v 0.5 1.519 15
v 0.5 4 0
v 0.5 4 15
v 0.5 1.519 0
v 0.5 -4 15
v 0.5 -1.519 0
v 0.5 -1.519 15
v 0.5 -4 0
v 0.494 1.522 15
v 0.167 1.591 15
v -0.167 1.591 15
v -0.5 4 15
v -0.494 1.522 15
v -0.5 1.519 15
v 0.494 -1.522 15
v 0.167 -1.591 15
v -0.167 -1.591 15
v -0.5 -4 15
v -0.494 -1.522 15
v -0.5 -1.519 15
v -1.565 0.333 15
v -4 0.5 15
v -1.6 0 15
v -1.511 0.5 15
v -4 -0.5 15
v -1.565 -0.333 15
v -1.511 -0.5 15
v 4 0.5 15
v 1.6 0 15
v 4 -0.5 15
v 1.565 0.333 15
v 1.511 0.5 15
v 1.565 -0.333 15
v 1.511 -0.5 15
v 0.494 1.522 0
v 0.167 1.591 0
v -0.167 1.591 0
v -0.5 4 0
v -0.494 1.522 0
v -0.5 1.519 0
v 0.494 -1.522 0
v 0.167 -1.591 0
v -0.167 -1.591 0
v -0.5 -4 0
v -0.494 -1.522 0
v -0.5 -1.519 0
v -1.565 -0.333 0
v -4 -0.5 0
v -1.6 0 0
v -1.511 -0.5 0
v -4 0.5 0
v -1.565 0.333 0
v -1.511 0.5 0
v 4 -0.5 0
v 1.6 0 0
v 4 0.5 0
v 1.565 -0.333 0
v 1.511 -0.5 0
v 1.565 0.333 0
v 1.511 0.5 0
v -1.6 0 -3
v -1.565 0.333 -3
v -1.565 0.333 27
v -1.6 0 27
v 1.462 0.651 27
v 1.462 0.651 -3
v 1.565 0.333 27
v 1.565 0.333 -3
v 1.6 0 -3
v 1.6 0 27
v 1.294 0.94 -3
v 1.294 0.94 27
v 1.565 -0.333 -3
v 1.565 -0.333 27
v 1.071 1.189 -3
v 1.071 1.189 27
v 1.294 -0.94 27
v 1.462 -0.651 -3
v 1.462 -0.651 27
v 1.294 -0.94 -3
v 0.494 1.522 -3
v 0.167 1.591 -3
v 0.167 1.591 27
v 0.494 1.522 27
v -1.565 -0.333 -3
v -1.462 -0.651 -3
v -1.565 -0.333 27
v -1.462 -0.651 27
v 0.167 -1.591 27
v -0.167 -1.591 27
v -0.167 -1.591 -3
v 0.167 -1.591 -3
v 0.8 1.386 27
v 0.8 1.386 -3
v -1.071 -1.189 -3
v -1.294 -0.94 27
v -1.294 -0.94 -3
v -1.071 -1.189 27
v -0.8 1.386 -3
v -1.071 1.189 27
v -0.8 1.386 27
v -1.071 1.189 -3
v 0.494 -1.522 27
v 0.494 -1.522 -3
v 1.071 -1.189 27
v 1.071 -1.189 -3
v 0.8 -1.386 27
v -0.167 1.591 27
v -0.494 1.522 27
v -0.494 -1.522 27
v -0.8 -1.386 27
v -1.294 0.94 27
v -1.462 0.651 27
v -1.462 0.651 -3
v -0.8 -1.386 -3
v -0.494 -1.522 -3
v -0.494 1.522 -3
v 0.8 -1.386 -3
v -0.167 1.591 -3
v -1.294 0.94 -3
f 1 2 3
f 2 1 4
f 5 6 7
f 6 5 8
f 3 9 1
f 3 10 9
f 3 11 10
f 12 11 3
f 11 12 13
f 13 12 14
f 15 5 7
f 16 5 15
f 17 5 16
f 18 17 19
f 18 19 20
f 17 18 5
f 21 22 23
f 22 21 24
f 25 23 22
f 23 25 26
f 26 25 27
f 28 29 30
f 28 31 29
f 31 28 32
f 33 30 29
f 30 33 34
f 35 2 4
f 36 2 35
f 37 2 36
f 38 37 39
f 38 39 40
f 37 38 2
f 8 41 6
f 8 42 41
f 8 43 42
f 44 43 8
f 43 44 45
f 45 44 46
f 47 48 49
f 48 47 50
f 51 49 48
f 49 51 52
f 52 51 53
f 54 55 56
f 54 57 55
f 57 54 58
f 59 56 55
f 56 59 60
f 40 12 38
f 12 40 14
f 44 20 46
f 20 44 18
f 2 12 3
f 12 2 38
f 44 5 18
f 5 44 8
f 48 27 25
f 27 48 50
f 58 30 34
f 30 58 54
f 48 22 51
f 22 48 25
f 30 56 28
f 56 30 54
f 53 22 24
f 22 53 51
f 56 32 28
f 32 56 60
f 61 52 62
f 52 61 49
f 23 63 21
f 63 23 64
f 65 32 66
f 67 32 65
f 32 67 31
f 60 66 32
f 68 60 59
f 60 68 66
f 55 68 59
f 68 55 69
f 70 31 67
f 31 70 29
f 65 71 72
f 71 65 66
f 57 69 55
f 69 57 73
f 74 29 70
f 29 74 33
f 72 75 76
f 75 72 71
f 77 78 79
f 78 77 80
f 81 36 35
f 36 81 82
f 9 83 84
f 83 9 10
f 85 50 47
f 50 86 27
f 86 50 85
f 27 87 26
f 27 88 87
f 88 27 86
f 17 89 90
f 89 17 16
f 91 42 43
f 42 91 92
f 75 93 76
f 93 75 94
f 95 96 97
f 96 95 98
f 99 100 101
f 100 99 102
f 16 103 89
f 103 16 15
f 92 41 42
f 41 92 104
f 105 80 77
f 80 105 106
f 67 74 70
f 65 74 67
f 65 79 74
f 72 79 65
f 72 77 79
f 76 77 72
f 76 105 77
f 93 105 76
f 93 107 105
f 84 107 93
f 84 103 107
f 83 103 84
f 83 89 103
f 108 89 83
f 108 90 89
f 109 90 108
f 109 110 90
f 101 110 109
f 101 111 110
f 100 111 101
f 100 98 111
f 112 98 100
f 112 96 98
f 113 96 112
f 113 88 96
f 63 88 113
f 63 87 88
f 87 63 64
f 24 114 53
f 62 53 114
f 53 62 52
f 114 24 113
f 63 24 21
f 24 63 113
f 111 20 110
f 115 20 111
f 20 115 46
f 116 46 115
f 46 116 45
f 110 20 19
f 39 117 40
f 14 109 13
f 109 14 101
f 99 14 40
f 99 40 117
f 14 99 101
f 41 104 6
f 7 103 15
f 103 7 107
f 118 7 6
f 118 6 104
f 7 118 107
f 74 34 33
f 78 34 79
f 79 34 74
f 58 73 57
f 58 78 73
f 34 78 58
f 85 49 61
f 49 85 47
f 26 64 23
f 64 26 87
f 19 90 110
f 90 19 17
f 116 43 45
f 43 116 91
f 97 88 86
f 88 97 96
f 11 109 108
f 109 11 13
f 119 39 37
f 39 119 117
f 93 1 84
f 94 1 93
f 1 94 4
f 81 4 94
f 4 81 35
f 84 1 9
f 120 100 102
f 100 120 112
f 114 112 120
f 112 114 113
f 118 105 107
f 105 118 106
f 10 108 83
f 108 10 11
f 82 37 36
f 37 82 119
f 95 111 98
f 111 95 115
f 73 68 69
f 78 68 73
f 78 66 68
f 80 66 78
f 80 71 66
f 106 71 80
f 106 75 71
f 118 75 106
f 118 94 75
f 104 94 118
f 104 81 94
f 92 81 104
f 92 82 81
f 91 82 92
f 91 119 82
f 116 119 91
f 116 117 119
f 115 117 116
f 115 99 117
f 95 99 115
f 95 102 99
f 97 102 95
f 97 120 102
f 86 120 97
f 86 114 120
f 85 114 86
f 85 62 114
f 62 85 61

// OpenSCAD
union() {
	translate([-0.5,-4,0])	
	cube([1,8,15]);

	translate([4,-0.5,0])	
	rotate(90,[0,0,1])
	cube([1,8,15]);

	translate([0,0,-3])	 cylinder( r=1.6, h=30, $fn=30 );
}
